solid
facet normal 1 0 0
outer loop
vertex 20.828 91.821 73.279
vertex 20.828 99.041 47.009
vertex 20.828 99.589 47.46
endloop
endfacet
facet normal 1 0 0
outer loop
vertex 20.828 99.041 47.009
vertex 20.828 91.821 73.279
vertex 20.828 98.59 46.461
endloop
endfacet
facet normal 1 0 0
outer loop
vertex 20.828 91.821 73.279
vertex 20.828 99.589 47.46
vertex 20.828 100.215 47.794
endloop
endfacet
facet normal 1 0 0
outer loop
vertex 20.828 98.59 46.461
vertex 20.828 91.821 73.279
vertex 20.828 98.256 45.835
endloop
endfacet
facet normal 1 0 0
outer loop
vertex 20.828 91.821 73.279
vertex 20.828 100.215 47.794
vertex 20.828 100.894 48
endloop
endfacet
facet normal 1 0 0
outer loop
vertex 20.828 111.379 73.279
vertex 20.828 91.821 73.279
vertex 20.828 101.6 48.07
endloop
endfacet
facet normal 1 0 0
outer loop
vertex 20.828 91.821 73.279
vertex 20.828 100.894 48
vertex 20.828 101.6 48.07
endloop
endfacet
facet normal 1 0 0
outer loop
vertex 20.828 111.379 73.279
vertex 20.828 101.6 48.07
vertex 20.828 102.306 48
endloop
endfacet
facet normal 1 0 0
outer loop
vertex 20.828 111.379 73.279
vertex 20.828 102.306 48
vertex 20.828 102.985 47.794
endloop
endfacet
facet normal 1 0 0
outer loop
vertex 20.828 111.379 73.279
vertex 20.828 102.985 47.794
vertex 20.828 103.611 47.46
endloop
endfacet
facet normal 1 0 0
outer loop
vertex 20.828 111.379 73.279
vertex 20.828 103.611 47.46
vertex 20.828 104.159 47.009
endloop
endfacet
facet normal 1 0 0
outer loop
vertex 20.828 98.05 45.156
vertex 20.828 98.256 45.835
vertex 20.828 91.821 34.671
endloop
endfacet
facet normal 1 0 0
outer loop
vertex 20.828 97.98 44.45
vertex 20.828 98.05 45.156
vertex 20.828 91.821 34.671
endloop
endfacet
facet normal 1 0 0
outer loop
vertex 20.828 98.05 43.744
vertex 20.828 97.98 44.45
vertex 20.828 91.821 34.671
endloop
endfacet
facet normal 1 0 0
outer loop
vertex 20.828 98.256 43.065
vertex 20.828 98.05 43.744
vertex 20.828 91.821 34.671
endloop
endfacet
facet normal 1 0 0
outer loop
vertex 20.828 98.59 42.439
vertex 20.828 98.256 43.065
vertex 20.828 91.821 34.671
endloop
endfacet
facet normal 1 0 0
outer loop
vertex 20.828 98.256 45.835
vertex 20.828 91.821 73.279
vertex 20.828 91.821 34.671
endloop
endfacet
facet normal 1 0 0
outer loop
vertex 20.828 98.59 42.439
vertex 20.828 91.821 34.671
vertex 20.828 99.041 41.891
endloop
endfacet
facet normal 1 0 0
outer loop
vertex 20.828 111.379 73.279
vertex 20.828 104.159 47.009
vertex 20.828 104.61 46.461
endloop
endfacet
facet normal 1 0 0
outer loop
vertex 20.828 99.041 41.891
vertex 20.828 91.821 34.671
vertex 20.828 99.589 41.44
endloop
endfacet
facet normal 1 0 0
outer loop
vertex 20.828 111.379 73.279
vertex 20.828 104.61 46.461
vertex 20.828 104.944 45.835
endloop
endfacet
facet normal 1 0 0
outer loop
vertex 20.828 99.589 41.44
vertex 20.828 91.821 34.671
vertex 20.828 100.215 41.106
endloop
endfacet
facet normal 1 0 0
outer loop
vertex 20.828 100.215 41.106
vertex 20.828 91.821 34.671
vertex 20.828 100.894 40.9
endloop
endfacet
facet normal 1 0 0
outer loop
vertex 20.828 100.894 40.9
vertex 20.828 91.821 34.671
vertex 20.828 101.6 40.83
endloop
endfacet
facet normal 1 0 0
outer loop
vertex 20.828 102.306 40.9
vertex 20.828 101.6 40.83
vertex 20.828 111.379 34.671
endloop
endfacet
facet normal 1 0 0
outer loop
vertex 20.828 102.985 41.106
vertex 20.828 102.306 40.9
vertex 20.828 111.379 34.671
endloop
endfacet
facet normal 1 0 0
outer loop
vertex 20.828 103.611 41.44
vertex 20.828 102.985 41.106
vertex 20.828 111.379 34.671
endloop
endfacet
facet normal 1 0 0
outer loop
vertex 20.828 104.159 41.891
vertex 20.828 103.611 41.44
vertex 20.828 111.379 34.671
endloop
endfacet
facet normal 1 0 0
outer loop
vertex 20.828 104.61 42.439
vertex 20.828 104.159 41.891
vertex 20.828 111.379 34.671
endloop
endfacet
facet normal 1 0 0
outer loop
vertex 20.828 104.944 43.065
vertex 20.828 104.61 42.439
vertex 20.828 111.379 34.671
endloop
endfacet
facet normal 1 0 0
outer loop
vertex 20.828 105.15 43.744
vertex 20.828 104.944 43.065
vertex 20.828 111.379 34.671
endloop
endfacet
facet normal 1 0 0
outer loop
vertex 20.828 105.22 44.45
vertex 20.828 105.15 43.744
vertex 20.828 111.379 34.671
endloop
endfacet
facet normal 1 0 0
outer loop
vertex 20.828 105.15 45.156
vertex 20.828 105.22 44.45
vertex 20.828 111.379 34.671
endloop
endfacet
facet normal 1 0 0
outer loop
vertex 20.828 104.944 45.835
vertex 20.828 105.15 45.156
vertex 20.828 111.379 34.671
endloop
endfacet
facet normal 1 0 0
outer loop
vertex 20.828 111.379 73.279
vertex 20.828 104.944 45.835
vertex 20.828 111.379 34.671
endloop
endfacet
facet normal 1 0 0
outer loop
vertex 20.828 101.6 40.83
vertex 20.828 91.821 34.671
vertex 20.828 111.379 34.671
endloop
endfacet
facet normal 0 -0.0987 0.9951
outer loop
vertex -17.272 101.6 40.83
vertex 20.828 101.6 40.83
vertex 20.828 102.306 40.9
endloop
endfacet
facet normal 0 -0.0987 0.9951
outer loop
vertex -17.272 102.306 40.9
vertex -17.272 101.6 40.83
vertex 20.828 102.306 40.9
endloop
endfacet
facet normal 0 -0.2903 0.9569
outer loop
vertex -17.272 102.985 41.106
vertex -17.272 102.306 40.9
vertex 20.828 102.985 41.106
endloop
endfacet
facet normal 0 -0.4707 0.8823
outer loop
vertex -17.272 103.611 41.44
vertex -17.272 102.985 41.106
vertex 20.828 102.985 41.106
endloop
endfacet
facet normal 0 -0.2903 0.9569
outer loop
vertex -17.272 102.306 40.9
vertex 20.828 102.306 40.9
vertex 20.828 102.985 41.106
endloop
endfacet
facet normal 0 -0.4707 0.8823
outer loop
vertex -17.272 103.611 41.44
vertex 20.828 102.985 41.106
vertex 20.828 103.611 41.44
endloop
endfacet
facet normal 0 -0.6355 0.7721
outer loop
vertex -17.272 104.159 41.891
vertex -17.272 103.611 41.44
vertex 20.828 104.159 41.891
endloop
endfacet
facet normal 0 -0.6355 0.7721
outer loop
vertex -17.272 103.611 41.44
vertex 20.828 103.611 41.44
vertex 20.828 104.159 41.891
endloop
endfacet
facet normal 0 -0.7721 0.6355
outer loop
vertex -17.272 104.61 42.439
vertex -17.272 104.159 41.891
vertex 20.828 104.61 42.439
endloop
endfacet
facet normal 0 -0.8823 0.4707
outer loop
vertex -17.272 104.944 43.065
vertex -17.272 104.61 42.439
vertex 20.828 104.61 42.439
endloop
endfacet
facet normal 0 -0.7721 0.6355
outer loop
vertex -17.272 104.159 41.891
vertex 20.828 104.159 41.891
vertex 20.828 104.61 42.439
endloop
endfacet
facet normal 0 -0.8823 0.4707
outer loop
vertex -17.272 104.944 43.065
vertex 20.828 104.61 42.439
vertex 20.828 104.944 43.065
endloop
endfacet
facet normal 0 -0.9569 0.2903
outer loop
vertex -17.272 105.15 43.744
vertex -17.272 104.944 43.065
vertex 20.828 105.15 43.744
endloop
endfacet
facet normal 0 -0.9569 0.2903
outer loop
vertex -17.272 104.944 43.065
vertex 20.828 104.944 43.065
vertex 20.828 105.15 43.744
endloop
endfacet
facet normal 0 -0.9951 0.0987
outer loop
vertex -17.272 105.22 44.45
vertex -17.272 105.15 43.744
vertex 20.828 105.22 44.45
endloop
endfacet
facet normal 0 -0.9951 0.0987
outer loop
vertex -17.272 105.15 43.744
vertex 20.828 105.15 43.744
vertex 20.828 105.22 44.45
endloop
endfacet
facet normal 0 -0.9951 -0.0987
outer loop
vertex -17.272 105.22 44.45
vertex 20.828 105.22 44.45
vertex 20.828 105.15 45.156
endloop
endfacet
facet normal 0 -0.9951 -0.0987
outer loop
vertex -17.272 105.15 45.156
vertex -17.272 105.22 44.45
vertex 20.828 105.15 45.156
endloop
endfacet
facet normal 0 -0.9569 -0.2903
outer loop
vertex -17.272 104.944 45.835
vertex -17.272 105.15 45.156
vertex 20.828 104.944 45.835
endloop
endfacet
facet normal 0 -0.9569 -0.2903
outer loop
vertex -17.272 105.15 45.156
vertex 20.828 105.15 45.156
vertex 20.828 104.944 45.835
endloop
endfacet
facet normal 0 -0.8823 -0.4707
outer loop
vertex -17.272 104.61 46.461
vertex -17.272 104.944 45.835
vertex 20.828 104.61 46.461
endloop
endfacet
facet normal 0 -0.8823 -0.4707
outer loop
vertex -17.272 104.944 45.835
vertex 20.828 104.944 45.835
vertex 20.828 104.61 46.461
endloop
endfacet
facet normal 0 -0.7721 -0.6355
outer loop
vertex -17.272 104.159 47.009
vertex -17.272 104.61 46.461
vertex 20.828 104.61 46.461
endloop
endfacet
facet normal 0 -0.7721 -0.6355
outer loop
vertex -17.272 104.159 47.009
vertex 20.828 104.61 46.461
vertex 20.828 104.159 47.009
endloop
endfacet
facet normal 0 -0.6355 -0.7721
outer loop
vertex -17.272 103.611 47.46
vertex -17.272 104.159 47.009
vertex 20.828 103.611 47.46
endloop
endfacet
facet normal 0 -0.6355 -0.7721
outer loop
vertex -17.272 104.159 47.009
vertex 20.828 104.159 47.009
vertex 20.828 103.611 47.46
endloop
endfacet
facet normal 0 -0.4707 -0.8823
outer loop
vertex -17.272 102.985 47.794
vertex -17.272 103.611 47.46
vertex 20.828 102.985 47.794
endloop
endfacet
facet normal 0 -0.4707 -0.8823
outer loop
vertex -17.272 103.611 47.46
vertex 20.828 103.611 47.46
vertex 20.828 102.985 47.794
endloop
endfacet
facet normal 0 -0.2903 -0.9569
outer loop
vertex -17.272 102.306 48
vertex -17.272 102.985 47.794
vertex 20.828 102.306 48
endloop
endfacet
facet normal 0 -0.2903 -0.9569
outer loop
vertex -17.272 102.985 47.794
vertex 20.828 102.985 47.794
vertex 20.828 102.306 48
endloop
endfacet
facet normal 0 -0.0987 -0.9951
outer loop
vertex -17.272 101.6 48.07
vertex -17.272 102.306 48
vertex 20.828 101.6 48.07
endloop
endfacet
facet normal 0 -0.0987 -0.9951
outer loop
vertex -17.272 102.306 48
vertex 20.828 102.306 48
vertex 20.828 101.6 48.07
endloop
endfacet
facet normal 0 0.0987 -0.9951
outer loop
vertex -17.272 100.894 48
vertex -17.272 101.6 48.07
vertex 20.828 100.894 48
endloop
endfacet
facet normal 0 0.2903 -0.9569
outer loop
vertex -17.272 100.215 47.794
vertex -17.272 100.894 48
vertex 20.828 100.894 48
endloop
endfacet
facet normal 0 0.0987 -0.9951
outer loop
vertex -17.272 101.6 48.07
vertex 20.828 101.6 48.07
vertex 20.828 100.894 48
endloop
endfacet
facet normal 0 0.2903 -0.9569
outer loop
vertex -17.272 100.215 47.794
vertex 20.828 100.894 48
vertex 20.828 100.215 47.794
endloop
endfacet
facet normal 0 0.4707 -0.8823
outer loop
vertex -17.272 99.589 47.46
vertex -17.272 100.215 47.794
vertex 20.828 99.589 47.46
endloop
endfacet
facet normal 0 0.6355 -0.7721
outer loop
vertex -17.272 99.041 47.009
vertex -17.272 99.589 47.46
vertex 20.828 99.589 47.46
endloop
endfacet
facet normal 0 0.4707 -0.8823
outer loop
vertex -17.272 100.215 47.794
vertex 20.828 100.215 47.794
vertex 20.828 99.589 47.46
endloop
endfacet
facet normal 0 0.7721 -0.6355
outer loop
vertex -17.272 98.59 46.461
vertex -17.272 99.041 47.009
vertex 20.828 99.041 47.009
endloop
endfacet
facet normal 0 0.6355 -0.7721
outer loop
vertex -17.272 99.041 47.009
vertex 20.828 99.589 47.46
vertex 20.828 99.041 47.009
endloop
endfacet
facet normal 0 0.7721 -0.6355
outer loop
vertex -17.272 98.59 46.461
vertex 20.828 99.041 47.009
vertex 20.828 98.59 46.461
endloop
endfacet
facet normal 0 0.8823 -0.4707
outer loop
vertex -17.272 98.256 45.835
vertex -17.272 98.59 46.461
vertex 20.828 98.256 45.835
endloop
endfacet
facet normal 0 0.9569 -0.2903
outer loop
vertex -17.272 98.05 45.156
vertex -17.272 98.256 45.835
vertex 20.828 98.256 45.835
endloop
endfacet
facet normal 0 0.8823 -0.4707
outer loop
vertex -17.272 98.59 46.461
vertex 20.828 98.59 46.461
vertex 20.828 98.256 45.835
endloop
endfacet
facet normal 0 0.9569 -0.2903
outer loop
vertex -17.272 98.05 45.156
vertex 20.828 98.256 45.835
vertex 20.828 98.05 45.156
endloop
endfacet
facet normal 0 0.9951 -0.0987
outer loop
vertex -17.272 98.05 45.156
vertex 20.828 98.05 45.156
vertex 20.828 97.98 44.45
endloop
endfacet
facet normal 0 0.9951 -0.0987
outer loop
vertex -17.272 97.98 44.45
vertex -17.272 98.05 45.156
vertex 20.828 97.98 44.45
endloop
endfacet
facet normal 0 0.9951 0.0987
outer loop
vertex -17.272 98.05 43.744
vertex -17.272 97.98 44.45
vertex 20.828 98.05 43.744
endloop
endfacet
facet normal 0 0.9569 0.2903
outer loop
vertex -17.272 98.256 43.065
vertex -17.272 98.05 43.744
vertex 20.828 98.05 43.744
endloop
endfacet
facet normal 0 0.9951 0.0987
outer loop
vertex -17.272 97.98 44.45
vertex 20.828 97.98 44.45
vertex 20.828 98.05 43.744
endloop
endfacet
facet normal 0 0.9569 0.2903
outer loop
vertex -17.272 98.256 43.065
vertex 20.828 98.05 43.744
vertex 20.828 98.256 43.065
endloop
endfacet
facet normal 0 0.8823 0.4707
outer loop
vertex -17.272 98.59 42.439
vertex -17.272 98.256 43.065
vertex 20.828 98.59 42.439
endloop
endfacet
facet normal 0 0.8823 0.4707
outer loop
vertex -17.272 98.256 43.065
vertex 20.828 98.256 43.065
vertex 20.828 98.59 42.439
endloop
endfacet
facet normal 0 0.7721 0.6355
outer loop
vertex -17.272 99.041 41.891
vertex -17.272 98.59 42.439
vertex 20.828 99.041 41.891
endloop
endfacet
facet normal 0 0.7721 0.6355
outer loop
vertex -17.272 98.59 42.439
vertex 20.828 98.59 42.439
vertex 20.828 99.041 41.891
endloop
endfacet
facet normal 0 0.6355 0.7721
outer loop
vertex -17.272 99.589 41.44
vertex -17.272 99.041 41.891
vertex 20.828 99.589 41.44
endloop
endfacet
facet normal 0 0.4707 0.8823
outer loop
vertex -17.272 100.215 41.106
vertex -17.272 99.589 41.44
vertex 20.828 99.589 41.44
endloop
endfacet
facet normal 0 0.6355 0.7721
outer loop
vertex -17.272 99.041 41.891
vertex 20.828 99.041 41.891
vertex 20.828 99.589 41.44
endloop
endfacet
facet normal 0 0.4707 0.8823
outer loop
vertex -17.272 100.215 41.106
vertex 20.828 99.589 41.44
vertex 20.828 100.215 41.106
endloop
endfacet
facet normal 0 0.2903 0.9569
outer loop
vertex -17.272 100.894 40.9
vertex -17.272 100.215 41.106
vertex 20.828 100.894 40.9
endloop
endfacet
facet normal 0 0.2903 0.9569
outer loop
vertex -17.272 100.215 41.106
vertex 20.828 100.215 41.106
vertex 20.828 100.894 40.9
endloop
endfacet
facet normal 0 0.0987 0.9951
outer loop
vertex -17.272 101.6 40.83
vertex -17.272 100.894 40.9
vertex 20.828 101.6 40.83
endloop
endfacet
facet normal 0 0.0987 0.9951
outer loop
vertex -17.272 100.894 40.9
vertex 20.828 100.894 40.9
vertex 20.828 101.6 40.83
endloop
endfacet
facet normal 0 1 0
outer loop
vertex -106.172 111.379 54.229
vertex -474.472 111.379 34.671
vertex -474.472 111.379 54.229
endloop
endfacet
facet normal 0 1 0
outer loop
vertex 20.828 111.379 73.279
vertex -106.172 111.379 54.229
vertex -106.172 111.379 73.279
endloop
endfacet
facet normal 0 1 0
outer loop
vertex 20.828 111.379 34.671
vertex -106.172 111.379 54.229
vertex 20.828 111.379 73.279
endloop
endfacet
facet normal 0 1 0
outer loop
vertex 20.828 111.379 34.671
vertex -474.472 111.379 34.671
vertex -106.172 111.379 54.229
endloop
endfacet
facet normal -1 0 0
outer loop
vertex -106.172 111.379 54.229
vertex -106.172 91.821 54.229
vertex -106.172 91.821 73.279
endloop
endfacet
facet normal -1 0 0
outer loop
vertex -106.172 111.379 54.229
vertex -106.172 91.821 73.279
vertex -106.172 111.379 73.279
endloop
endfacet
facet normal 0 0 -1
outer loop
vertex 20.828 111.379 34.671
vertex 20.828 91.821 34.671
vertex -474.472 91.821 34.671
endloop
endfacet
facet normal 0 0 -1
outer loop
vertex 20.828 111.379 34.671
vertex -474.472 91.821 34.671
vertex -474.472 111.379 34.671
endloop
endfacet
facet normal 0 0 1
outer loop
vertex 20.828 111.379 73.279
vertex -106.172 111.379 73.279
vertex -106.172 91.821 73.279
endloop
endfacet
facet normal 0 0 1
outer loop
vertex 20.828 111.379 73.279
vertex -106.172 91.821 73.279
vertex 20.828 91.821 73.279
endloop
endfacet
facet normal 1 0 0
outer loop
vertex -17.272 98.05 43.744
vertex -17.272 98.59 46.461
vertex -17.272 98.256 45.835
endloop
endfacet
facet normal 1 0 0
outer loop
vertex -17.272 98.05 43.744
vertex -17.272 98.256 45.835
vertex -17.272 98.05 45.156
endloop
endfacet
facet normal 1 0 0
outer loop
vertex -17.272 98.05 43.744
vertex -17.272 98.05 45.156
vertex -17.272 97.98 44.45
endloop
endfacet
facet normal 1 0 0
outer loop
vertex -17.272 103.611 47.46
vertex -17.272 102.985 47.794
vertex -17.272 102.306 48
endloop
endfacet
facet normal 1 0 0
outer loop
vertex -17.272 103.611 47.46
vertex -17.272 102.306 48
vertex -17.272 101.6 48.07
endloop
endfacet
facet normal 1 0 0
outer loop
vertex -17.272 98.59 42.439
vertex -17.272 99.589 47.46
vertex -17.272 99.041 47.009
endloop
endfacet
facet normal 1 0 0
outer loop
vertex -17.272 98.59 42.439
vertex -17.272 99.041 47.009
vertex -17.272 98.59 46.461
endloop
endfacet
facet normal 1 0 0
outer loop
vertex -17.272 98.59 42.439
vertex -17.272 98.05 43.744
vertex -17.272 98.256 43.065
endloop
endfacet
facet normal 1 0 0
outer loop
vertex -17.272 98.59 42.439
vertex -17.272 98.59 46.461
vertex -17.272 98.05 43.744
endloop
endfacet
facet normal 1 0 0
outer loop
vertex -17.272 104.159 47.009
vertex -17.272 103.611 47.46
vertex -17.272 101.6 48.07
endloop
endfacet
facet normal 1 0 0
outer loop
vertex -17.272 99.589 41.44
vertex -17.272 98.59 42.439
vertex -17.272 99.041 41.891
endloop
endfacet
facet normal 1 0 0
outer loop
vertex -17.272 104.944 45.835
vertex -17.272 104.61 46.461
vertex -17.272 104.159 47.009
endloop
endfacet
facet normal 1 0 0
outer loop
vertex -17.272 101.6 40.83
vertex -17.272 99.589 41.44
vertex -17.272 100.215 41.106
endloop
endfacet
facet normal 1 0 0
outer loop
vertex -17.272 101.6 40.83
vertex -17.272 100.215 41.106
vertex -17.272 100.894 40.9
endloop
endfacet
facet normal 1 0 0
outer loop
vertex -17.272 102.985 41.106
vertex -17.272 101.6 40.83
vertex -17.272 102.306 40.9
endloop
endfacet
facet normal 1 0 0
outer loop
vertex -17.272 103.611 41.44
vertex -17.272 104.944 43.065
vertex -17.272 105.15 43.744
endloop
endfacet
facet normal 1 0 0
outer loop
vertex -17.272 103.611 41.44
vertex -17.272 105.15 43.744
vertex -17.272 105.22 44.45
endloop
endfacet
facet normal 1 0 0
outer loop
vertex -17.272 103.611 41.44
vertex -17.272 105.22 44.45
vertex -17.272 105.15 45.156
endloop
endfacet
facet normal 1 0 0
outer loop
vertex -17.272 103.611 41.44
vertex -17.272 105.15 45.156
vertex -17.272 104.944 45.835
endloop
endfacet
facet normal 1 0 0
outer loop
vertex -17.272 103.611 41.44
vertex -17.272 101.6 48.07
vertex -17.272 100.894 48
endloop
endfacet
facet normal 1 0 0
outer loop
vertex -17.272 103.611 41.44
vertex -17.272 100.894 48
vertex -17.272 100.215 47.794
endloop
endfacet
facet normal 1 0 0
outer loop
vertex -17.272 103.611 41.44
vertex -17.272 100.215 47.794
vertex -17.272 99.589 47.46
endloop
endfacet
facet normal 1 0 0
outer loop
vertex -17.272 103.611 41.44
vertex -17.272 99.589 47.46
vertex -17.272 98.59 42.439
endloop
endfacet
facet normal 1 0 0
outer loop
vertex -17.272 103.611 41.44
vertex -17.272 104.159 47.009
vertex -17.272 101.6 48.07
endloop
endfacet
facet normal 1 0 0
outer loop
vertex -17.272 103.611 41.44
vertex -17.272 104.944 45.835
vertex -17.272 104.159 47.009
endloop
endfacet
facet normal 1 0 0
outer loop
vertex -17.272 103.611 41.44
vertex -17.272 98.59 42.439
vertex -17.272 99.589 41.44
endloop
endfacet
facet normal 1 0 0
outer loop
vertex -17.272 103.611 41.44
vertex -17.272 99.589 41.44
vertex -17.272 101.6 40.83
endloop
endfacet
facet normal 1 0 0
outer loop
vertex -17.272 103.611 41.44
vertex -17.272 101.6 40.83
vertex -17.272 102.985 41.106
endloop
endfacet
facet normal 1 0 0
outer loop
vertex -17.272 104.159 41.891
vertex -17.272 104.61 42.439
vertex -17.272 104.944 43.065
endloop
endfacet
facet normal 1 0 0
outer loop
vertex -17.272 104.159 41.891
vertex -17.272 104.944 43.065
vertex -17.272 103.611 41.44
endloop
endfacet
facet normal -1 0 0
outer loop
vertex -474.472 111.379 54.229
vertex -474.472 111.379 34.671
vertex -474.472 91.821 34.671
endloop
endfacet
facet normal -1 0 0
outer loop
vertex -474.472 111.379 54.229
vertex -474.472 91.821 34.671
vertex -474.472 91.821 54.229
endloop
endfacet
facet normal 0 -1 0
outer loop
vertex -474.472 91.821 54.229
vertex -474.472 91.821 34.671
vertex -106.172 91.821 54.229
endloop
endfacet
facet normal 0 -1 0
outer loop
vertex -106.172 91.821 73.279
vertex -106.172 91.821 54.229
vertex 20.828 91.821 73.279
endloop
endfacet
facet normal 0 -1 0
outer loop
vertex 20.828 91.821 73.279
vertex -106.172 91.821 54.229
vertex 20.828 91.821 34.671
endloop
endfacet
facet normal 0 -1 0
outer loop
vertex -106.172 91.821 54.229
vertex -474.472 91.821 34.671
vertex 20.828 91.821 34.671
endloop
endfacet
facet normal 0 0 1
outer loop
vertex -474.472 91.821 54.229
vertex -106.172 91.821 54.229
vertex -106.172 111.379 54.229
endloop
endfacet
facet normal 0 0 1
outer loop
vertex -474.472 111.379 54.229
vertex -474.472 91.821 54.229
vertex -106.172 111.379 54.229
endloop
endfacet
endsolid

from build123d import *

# Parameters (mm, degrees)
BOSS_EXTRUDE1_DEPTH      = 457.2
BOSS_EXTRUDE1_DEPTH_BACK = 38.1
SKETCH1_W                = 19.558
SKETCH1_H                = 19.558
SKETCH2_R                = 3.6195
CUT_EXTRUDE1_DEPTH       = 38.1
SKETCH3_W                = 127
SKETCH3_H                = 19.558
BOSS_EXTRUDE2_DEPTH      = 19.05


with BuildPart() as part:
    # Sketch1 → Boss-Extrude1 (new, two sides: drawn at the far end of the back side and taken through both)
    with BuildSketch(Plane.ZY.offset(17.272).offset(-BOSS_EXTRUDE1_DEPTH_BACK)):
        with Locations((44.45, 101.6)):
            Rectangle(SKETCH1_W, SKETCH1_H)
    extrude(amount=BOSS_EXTRUDE1_DEPTH + BOSS_EXTRUDE1_DEPTH_BACK)

    # Sketch2 → Cut-Extrude1 (cut)
    with BuildSketch(Plane(origin=(20.828, 0, 0), x_dir=(0, 0, -1), z_dir=(1, 0, 0))):
        with Locations((-44.45, 101.6)):
            Circle(SKETCH2_R)
    extrude(amount=-CUT_EXTRUDE1_DEPTH, mode=Mode.SUBTRACT)

    # Sketch3 → Boss-Extrude2 (add)
    with BuildSketch(Plane.XY.offset(54.229)):
        with Locations((-42.672, 101.6)):
            Rectangle(SKETCH3_W, SKETCH3_H)
    extrude(amount=BOSS_EXTRUDE2_DEPTH)


solid = part.part
